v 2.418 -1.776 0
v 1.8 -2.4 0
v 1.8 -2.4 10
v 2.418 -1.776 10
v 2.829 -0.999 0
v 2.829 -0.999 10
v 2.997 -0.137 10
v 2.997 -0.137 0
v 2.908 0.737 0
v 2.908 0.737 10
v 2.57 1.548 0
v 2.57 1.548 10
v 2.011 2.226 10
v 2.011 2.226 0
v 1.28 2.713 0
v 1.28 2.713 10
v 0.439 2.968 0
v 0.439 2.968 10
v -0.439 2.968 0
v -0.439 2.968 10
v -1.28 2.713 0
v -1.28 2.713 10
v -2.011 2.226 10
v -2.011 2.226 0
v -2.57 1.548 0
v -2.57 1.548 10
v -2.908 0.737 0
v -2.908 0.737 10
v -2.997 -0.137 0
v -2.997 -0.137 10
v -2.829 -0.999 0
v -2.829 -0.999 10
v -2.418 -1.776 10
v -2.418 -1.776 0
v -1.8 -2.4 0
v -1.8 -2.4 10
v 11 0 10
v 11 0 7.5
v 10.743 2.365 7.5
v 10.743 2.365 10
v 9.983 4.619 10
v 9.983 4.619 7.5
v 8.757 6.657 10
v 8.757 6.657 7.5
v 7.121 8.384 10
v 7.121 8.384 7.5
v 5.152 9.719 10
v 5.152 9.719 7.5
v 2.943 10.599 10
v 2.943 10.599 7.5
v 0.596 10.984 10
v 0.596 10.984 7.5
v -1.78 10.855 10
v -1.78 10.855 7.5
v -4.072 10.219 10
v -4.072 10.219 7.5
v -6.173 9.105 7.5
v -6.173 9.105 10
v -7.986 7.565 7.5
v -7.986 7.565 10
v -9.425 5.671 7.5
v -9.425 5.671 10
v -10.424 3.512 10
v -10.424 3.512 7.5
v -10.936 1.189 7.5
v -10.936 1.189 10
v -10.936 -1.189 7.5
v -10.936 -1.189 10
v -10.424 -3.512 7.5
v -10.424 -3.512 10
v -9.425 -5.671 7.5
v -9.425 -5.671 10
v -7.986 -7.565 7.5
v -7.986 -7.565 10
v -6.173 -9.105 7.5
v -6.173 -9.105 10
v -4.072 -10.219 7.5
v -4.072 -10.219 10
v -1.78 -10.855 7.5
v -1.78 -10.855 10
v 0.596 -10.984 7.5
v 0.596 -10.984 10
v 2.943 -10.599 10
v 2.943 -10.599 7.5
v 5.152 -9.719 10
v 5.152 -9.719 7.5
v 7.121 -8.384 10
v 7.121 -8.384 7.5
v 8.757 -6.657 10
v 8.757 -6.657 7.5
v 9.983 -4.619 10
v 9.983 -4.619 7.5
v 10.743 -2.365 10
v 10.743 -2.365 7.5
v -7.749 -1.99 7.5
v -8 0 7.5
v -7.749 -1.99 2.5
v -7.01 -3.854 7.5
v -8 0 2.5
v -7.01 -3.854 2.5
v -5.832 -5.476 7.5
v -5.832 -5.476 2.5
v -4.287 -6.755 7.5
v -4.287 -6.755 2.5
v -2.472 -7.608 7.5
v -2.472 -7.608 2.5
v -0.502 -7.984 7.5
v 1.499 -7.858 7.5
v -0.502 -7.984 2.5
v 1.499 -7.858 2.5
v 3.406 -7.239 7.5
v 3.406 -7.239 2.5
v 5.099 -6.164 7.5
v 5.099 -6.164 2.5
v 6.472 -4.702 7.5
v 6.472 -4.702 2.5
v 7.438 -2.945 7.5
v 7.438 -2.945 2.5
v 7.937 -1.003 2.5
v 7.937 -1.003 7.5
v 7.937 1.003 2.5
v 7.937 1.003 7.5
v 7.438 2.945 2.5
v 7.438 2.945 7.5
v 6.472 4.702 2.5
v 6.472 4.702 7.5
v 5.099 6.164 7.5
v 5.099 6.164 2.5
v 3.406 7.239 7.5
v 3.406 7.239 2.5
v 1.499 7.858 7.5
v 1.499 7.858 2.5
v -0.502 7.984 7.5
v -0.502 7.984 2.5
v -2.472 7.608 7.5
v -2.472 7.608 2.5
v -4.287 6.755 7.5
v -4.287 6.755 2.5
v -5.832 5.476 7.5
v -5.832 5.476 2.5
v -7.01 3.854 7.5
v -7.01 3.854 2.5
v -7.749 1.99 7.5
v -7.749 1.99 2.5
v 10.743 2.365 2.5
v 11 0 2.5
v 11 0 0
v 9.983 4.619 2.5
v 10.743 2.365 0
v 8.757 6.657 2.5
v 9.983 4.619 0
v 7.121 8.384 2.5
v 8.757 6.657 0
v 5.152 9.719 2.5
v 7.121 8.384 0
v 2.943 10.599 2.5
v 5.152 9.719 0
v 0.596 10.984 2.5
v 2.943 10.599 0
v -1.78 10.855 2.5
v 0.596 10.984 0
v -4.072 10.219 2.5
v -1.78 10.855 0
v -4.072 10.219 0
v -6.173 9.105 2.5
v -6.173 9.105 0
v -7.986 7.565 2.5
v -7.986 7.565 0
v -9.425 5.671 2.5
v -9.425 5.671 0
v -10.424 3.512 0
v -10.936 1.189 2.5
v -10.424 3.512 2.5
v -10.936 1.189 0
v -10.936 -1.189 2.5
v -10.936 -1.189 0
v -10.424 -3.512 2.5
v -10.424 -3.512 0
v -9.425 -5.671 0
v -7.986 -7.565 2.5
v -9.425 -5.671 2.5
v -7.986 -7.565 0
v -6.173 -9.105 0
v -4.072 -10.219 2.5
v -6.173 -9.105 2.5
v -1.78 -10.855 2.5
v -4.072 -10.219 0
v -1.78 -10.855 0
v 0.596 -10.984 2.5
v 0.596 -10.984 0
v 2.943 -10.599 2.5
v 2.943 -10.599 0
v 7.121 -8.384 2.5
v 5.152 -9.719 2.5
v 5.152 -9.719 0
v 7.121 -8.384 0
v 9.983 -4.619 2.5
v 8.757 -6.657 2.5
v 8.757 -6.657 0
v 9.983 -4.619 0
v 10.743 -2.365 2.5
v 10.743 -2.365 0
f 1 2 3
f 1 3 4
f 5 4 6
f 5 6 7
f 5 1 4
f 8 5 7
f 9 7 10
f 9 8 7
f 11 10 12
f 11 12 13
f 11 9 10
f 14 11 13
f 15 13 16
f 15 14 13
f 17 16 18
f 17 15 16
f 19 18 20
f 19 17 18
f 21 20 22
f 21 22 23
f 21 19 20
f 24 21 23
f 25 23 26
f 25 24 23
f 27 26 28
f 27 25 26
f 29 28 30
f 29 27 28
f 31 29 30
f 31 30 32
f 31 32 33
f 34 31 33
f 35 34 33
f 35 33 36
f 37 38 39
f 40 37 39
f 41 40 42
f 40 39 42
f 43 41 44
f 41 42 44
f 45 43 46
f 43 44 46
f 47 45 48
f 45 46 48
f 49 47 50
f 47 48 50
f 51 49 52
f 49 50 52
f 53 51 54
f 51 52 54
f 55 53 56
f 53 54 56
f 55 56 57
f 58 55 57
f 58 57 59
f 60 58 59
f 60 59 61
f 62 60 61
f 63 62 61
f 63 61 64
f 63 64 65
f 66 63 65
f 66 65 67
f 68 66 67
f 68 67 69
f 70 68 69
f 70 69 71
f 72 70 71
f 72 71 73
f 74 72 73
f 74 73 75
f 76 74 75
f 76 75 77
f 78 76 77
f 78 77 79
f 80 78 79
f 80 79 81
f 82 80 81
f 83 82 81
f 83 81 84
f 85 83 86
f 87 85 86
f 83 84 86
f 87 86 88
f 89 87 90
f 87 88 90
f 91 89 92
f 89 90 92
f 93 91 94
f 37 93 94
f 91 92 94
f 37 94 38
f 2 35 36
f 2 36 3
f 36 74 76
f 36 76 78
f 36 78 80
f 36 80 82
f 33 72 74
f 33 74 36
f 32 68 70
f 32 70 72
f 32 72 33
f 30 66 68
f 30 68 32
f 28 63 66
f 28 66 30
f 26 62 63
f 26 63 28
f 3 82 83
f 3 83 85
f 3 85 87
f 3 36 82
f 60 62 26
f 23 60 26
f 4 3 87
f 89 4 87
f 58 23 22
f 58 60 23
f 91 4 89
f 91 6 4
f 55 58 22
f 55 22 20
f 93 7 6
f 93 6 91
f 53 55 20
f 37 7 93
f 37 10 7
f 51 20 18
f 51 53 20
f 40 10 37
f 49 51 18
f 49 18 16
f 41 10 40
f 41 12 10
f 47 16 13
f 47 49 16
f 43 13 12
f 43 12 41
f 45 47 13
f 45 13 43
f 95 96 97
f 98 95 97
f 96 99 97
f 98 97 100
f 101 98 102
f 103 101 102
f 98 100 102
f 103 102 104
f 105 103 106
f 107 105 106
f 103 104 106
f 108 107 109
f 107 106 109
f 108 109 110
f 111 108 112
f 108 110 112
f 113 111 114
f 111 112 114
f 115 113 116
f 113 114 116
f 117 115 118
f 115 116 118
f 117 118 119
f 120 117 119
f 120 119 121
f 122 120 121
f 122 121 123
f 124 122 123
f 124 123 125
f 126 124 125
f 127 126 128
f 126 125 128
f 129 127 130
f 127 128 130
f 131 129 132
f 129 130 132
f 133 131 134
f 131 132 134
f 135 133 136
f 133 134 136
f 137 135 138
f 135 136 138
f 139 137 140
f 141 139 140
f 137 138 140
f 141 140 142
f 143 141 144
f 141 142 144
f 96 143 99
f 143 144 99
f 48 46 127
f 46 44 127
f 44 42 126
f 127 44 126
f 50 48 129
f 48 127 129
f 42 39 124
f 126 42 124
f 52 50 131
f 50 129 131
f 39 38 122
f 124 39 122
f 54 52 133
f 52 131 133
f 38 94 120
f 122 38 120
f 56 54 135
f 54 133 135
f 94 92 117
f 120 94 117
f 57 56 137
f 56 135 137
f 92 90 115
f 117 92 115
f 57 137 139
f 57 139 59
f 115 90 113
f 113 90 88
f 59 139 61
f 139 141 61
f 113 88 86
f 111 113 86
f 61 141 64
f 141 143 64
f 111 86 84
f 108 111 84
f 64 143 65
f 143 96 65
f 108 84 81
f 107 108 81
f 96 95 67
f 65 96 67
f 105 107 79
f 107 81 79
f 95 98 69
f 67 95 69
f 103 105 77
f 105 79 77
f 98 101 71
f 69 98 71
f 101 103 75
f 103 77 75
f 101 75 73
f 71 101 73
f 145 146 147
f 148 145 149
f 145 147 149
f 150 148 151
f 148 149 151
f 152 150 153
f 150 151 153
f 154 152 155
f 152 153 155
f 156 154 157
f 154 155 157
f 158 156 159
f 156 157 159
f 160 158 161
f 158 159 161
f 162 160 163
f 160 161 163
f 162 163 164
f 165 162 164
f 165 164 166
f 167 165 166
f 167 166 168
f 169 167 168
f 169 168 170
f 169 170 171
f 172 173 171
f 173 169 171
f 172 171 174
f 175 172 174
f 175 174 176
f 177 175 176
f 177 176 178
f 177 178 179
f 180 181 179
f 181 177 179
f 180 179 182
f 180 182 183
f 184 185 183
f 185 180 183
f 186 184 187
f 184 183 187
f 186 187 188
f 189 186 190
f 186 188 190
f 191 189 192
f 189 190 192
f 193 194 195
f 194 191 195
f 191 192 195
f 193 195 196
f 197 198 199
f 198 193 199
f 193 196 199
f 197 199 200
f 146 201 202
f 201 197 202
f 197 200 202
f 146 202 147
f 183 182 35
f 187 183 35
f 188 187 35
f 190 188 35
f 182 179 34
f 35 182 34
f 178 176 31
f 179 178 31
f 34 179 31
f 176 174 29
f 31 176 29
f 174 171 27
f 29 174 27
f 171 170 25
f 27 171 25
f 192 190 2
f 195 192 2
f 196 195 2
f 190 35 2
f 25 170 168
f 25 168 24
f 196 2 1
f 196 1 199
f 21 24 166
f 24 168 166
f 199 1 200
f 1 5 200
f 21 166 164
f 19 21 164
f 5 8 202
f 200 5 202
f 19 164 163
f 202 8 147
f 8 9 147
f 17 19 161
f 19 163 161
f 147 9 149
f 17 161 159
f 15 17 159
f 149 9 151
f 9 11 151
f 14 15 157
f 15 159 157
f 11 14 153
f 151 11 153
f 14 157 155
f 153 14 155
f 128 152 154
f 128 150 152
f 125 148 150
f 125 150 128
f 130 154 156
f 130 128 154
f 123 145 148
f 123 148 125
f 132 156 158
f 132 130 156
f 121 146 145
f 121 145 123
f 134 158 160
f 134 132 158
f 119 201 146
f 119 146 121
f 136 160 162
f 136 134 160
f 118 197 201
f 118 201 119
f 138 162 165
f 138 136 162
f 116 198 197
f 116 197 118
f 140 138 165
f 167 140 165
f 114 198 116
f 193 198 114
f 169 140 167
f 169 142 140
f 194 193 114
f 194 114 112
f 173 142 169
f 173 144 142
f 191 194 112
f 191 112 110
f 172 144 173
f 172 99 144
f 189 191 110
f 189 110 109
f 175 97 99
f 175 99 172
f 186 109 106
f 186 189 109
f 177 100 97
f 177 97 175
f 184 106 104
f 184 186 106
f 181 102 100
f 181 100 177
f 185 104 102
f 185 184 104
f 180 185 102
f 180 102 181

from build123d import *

# Parameters (mm, degrees)
SKETCH1_R           = 11
BOSS_EXTRUDE1_DEPTH = 10
SKETCH2_W           = 3
SKETCH2_H           = 5


with BuildPart() as part:
    # Sketch1 → Boss-Extrude1 (new body)
    with BuildSketch(Plane.XY):
        Circle(SKETCH1_R)
        with BuildLine():
            ThreePointArc((1.8, -2.4), (0, 3), (-1.8, -2.4))
            Line((-1.8, -2.4), (1.8, -2.4))
        make_face(mode=Mode.SUBTRACT)
    extrude(amount=BOSS_EXTRUDE1_DEPTH)

    # Sketch2 → Cut-Revolve1 (revolve, cut)
    with BuildSketch(Plane(origin=(0, 0, 0), x_dir=(1, 0, 0), z_dir=(0, 1, 0))):
        with Locations((-9.5, -5)):
            Rectangle(SKETCH2_W, SKETCH2_H)
    revolve(axis=Axis((0, 0, 0), (0, 0, 1)), mode=Mode.SUBTRACT)


solid = part.part
